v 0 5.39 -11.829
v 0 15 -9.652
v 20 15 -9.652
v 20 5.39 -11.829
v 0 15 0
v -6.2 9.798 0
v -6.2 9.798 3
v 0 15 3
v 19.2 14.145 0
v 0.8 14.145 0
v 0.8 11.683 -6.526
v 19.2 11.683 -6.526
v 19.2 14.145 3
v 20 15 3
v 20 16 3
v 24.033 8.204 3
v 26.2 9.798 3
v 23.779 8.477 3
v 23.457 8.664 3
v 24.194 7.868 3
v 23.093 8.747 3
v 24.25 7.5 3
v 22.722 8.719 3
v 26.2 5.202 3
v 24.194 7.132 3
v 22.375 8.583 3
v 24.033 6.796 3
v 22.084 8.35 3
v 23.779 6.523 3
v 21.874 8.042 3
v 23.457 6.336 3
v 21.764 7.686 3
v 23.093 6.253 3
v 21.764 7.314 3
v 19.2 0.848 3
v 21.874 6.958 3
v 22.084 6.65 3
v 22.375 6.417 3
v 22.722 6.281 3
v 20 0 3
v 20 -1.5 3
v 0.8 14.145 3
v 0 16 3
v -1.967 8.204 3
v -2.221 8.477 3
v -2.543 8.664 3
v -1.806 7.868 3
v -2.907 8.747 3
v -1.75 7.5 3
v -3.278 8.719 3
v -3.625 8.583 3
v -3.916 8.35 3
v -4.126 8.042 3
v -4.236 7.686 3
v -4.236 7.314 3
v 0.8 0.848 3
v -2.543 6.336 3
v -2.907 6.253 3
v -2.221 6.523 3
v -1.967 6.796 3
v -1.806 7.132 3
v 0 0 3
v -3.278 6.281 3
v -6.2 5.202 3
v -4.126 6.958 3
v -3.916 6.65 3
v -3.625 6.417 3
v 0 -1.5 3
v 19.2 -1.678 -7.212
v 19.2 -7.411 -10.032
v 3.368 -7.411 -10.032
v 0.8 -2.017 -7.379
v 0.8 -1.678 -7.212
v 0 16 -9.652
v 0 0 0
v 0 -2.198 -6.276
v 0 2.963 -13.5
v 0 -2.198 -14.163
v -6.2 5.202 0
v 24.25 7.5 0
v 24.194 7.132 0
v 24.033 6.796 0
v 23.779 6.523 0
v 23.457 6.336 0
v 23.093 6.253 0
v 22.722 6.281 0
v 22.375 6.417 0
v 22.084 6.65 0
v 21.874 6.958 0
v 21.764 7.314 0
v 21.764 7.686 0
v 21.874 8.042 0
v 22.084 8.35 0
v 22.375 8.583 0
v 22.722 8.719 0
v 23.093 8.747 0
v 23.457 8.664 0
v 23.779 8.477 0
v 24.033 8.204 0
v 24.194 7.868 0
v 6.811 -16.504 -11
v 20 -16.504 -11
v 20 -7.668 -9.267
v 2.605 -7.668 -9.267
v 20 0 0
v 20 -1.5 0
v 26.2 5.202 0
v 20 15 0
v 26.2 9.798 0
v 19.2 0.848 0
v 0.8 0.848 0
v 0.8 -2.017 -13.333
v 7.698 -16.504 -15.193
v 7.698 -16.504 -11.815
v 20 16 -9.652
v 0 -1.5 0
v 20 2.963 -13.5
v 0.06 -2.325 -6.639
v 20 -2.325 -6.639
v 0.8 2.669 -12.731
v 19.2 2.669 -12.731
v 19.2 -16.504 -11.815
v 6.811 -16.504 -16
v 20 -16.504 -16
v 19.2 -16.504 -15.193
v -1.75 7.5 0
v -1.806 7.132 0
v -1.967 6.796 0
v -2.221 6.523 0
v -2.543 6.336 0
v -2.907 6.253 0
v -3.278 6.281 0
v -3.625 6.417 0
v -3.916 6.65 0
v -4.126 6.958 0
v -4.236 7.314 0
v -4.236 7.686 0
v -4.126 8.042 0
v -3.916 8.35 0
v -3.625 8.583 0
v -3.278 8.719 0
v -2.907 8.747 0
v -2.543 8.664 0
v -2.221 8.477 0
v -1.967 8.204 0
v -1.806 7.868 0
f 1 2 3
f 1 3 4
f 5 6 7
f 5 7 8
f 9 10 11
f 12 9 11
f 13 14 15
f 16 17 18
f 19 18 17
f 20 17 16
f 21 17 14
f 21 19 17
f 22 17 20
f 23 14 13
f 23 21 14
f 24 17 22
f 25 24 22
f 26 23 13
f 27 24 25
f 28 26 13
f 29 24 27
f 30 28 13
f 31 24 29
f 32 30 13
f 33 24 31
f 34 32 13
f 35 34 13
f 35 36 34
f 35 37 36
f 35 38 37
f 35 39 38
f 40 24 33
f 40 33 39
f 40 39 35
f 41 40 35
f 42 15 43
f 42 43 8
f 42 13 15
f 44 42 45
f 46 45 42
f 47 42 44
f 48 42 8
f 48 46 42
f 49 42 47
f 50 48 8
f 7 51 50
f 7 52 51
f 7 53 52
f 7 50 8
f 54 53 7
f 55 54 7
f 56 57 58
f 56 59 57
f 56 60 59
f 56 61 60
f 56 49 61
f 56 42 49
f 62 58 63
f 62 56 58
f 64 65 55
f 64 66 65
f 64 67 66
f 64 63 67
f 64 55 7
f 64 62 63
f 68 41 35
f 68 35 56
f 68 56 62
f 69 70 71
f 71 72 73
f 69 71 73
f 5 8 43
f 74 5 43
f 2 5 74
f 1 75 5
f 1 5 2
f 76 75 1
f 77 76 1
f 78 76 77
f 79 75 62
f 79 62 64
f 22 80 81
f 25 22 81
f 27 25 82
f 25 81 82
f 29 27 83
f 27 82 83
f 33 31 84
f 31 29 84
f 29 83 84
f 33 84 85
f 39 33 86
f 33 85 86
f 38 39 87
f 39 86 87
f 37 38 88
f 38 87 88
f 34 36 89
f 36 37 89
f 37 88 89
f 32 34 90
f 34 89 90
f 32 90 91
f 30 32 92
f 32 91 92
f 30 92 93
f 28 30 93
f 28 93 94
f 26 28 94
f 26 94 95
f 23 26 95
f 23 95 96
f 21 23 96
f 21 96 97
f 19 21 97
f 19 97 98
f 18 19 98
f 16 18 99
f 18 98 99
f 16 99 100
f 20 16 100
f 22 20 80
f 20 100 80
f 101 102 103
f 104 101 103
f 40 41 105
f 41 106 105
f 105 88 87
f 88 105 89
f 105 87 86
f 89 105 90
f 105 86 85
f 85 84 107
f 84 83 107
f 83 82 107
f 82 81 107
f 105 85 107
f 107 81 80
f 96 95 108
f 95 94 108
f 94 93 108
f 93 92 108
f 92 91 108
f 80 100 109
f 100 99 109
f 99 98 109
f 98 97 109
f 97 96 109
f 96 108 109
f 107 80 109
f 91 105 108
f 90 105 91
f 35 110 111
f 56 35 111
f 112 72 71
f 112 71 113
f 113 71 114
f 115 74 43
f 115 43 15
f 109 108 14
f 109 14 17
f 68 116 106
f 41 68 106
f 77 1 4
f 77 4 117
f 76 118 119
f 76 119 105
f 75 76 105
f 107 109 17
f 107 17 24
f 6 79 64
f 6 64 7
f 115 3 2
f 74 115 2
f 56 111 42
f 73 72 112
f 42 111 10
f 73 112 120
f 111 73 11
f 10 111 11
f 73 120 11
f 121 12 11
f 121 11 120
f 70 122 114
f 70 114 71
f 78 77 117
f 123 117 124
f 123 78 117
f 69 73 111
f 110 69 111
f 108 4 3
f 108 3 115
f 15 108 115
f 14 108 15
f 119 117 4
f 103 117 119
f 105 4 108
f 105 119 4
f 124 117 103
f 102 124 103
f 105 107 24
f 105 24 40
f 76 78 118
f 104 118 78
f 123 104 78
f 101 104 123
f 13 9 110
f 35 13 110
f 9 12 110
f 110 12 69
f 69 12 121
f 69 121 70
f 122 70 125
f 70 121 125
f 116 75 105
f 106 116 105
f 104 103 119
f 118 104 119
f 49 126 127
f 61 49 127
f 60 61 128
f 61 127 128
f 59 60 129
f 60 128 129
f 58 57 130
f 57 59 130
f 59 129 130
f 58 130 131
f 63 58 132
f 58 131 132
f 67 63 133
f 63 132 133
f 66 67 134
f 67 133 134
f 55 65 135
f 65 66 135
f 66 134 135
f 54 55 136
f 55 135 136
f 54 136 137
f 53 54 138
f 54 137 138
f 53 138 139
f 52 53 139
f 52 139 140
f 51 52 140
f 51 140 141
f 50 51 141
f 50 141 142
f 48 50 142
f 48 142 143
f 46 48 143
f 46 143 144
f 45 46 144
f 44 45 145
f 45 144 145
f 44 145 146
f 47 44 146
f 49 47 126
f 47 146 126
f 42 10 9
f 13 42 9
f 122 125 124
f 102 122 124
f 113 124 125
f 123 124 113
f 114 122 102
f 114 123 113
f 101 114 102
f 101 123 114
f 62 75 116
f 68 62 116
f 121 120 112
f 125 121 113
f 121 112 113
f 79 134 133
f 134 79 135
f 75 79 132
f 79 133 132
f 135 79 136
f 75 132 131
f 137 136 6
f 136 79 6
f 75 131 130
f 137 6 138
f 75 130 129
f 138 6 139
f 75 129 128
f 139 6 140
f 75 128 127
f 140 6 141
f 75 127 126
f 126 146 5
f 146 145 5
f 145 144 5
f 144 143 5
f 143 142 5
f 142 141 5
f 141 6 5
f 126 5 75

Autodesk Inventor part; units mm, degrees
ref_plane "YZ Plane" through (0, 0, 0) normal (1, 0, 0) x (0, 1, 0)
ref_plane "XZ Plane" through (0, 0, 0) normal (0, 1, 0) x (-1, 0, 0)
ref_plane "XY Plane" through (0, 0, 0) normal (0, 0, 1) x (1, 0, 0)
sketch "Sketch1" plane through (0, 0, 0) normal (1, 0, 0) x (0, 1, 0)
  line L0 (0, 0) -> (15, 0)
  line L1 (15, 0) -> (12.3428, -7.0424)
  line L2 (12.3428, -7.0424) -> (2.9628, -13.5)
  line L3 (2.9628, -13.5) -> (-16.504, -16)
  line L4 (-16.504, -16) -> (-16.504, -11)
  line L5 (-16.504, -11) -> (-7.6685, -9.267)
  line L6 (-7.6685, -9.267) -> (-2.3251, -6.639)
  line L7 (-2.3251, -6.639) -> (0, 0)
  dimension "d0" = 15
  dimension "d24" = 16
  dimension "d27" = 5
extrude "Extrusion1" add sketch "Sketch1" along normal blind 20
sketch "Sketch2" plane through (0, 0, 0) normal (0, 0, 1) x (1, 0, 0)
  line L0 (-0.936, -0.2322) -> (7.6821, -18.3326)
  line L1 (7.6821, -18.3326) -> (-7.1135, -18.3326)
  line L2 (-7.1135, -18.3326) -> (-0.936, -0.2322)
extrude "Extrusion2" cut sketch "Sketch2" against normal blind 25
shell "Shell1" thickness 0.8 removed faces 2 at (6.6667, 5, 0) at (11.2076, -16.504, -14.3333)
sketch "Sketch3" plane through (0, 0, 0) normal (0, 0, 1) x (1, 0, 0)
  line L0 (0.8, 0.8476) -> (0.8, 14.1449) projected
  line L1 (0.8, 14.1449) -> (19.2, 14.1449) projected
  line L2 (19.2, 14.1449) -> (19.2, 0.8476) projected
  line L3 (19.2, 0.8476) -> (0.8, 0.8476) projected
  line L4 (0, 0) -> (0, 15) projected
  line L5 (0, 0) -> (20, 0) projected
  line L6 (20, 15) -> (20, 0) projected
  line L7 (0, 15) -> (20, 15) projected
  circle A0 centre (-3, 7.5) radius 1.25
  circle A1 centre (23, 7.5) radius 1.25
  line L8 (0, 0) -> (-6.2, 5.2024)
  line L9 (-6.2, 5.2024) -> (-6.2, 9.7976)
  line L10 (-6.2, 9.7976) -> (0, 15)
  line L11 (20, 15) -> (26.2, 9.7976)
  line L12 (26.2, 9.7976) -> (26.2, 5.2024)
  line L13 (26.2, 5.2024) -> (20, 0)
  line L14 (0, 0) -> (0, -1.5)
  line L15 (0, -1.5) -> (20, -1.5)
  line L16 (20, -1.5) -> (20, 0)
  dimension "d6" = 2.5
  dimension "d8" = 2.5
  dimension "d9" = 3
  dimension "d10" = 3
  dimension "d11" = 7.5
  dimension "d12" = 7.5
  dimension "d17" = 130
  dimension "d18" = 130
  dimension "d19" = 130
  dimension "d20" = 130
  dimension "d21" = 6.2
  dimension "d22" = 6.2
  dimension "d23" = 1.5
extrude "Extrusion3" add sketch "Sketch3" along normal blind 3
sketch "Sketch4" plane through (20, 0, 0) normal (1, 0, 0) x (0, 0, -1)
  line L0 (13.5, 2.9628) -> (7.0424, 12.3428) projected
  line L1 (7.0424, 12.3428) -> (0, 15) projected
  line L2 (0, 15) -> (9.6524, 15)
  line L3 (9.6524, 15) -> (11.8288, 5.3904)
extrude "Extrusion4" add sketch "Sketch4" against normal blind 20
sketch "Sketch5" plane through (0, 15, 3) normal (0, 1, 0) x (1, 0, 0)
  line L0 (0, 3) -> (0, 0) projected
  line L1 (20, 0) -> (0, 0) projected
  line L2 (20, 3) -> (20, 0) projected
  line L3 (20, 12.6524) -> (20, 3) projected
  line L4 (20, 12.6524) -> (0, 12.6524) projected
  line L5 (0, 3) -> (0, 12.6524) projected
extrude "Extrusion5" add sketch "Sketch5" along normal blind 1
properties part number "dysza_abs2"
